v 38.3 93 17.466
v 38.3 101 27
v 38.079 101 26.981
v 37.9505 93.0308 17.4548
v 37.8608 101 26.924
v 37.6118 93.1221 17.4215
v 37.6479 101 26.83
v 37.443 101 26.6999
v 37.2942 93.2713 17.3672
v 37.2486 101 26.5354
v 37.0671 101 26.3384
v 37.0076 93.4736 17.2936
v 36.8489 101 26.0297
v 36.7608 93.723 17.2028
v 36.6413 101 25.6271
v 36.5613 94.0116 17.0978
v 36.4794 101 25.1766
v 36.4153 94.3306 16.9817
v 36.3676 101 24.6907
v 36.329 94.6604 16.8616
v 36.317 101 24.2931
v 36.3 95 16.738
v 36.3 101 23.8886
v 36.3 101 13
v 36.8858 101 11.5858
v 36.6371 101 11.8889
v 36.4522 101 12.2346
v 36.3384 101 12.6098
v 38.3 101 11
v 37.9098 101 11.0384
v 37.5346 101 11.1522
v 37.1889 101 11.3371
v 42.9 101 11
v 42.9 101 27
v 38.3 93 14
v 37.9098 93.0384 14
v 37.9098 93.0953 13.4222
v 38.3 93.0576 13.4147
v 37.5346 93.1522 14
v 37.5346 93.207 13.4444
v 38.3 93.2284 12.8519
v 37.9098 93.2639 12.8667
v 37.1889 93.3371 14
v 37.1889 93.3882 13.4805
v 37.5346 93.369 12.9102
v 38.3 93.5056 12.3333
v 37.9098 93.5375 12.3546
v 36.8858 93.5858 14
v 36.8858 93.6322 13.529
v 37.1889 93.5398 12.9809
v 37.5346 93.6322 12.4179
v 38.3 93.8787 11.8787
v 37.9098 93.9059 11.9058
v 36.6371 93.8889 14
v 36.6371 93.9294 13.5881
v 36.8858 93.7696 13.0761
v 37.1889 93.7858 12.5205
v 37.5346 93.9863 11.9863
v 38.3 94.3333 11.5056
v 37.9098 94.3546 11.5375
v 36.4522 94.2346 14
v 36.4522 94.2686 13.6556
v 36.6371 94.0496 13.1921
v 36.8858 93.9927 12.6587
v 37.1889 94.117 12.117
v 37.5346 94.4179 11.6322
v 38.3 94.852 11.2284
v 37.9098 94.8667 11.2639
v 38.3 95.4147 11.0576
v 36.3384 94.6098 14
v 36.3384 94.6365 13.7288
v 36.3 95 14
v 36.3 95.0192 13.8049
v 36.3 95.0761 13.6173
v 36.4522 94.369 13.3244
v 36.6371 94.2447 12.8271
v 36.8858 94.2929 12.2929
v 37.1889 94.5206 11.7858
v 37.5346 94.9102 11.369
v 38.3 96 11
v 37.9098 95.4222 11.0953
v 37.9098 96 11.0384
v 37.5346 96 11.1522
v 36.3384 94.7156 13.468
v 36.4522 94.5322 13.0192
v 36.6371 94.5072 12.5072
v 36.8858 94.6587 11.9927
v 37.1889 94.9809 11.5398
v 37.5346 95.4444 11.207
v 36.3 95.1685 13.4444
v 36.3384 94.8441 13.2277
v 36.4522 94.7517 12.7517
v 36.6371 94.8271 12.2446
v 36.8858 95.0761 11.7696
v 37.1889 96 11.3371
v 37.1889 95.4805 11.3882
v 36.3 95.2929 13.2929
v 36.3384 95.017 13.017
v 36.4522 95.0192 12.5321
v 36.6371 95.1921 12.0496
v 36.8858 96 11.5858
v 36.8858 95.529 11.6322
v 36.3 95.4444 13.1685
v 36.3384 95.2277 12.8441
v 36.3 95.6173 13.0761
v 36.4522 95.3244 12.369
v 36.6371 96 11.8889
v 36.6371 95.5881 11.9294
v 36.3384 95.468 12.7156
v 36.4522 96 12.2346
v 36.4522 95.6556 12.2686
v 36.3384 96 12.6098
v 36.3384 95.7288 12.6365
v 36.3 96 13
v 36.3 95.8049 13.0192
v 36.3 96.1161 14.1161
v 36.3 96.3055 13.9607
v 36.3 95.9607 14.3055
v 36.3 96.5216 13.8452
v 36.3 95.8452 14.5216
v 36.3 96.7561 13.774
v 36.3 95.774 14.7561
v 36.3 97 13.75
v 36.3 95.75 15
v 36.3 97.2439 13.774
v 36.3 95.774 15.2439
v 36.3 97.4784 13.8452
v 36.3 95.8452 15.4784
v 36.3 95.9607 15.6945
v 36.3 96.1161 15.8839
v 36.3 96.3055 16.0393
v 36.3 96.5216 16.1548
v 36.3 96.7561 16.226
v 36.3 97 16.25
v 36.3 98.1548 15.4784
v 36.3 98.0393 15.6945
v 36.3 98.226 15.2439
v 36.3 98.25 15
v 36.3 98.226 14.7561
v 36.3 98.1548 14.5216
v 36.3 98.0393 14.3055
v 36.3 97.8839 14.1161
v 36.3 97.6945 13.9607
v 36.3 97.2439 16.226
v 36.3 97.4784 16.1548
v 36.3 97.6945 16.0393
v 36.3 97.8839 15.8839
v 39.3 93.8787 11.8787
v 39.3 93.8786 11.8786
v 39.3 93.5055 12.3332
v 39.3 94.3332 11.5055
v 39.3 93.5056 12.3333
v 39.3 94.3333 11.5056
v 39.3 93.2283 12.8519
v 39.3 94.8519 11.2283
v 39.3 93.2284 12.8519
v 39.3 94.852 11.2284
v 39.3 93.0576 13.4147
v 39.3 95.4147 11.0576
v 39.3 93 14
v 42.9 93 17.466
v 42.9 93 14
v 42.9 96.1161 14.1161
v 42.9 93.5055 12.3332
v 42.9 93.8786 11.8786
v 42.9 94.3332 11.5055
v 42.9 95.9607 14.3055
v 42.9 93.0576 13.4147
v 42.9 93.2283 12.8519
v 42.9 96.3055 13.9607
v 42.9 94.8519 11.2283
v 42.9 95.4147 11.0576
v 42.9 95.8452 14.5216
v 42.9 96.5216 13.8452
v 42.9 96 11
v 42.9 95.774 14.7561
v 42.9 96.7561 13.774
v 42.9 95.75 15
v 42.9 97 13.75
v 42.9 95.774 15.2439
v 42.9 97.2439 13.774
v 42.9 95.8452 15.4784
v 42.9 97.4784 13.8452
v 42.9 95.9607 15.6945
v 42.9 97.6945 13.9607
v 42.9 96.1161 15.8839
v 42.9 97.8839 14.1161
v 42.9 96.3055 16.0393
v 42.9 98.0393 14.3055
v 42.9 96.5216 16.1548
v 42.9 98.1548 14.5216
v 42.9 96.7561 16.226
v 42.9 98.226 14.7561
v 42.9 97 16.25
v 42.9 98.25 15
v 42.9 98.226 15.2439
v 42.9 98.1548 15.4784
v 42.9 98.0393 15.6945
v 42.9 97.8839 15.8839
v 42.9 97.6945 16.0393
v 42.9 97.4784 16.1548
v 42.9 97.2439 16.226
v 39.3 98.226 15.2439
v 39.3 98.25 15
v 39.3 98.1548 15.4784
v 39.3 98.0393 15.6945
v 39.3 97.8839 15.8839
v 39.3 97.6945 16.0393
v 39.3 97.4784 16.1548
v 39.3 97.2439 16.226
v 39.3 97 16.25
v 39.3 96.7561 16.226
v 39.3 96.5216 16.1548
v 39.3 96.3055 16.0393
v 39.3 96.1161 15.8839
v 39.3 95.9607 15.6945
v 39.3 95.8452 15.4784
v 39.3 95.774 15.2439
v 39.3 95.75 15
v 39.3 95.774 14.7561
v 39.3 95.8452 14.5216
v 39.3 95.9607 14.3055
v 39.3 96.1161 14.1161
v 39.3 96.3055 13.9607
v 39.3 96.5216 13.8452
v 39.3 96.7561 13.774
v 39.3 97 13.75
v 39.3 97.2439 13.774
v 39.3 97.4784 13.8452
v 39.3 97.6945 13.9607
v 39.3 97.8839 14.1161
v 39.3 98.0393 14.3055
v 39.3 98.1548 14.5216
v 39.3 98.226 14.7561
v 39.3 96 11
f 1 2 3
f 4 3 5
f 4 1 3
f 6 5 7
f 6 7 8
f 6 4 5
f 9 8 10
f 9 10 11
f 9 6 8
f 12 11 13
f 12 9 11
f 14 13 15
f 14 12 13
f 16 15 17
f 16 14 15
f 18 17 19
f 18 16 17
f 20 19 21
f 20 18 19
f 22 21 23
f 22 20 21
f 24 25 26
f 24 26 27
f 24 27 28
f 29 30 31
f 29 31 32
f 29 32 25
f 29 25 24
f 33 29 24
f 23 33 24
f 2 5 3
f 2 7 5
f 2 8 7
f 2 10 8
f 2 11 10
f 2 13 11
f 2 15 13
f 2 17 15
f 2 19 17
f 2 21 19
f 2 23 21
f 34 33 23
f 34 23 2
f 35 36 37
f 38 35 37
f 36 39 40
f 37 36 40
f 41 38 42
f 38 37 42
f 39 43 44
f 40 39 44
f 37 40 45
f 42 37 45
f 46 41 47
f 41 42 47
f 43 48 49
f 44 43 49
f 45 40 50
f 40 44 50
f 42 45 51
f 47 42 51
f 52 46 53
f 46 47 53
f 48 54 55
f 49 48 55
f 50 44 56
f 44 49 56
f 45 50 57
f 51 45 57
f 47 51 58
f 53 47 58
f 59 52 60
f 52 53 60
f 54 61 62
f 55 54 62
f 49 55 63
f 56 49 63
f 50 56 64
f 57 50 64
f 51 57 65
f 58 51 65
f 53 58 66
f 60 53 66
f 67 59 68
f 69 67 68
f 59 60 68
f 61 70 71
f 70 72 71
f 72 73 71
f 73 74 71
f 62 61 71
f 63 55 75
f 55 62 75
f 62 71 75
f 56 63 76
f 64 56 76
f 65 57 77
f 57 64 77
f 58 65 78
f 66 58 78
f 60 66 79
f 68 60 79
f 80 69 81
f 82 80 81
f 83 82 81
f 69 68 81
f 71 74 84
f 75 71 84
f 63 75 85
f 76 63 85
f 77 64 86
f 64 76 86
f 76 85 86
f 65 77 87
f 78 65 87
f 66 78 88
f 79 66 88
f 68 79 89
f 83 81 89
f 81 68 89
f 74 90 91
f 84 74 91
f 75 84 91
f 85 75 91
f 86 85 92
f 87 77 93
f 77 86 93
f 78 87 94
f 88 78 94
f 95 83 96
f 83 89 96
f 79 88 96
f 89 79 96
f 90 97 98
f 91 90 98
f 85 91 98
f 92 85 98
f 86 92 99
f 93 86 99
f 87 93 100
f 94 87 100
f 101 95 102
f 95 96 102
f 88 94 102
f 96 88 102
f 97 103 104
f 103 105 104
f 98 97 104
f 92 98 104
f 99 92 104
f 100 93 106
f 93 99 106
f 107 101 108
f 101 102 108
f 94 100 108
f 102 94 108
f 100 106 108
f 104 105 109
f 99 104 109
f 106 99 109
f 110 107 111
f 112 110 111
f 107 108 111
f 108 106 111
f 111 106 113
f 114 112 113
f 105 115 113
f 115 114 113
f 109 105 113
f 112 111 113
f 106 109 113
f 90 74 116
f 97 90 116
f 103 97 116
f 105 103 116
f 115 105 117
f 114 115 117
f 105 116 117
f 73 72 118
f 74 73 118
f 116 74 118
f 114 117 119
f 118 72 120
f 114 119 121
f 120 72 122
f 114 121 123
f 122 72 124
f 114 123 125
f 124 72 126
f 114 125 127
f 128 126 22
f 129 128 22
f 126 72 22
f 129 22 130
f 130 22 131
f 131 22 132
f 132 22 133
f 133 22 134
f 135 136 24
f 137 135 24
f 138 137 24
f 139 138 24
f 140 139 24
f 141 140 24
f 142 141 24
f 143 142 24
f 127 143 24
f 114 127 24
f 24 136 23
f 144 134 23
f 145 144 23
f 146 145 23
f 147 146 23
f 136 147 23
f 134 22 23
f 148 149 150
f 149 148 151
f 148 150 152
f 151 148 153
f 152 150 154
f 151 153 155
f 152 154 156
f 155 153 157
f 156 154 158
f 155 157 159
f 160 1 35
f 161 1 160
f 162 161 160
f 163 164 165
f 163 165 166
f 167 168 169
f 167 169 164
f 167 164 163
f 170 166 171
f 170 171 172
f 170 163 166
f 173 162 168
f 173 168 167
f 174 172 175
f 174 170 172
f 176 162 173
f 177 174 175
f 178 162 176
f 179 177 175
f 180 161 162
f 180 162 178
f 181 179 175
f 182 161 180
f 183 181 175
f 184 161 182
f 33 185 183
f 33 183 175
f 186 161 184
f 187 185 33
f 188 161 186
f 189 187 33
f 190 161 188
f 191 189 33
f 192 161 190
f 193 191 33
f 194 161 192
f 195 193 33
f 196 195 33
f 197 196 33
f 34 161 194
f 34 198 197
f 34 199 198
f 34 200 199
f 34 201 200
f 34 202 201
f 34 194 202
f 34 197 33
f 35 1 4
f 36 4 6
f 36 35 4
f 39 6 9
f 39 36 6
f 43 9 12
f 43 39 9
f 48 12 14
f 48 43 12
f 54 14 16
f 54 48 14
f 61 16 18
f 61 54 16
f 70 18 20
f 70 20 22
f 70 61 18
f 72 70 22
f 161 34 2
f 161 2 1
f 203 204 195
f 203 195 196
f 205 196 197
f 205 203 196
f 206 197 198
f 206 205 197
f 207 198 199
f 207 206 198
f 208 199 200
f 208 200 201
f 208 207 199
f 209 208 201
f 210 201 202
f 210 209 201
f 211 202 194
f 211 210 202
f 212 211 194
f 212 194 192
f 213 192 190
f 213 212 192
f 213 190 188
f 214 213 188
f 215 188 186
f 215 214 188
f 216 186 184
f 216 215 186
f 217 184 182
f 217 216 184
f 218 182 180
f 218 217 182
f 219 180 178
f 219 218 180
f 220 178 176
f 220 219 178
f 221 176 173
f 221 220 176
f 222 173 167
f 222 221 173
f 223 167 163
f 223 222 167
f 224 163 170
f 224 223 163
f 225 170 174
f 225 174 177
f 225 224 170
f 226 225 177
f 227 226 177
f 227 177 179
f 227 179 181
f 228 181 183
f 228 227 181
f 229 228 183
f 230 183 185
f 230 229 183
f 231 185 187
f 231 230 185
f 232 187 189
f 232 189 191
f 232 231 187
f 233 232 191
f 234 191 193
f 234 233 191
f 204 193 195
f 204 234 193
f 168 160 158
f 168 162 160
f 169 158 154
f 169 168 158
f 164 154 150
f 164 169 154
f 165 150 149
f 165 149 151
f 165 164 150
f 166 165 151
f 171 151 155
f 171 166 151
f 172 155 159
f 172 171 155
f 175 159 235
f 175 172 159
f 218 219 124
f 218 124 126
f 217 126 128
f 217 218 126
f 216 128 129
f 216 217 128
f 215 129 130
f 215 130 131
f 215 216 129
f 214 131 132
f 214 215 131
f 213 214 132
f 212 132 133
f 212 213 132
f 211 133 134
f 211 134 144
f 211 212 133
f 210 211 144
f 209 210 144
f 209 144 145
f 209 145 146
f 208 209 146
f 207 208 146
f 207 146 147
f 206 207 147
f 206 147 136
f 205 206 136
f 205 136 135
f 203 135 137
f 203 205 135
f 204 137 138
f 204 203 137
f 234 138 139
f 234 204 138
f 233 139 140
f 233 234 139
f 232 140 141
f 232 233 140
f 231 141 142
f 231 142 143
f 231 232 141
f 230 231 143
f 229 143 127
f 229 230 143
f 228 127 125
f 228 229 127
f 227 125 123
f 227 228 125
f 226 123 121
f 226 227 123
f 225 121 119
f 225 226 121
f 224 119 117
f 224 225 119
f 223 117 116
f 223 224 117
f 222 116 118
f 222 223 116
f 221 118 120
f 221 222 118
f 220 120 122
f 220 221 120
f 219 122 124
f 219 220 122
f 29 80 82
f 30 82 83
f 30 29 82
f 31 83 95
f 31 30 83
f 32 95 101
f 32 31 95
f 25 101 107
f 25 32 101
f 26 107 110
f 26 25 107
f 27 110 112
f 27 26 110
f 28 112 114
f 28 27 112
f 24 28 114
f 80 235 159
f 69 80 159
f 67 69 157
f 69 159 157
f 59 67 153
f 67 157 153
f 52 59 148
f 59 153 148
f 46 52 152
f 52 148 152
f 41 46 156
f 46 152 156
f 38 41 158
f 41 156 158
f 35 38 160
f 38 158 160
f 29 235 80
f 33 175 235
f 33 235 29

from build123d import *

# Parameters (mm, degrees)
SKETCH062_R  = 1.25
PAD029_DEPTH = 1.8
SKETCH064_R  = 1.25
PAD032_DEPTH = 3
FILLET004_R  = 2


with BuildPart() as part:
    # Sketch062 → Pad029 (new body, symmetric)
    with BuildSketch(Plane.YZ.offset(-41.1)):
        with BuildLine():
            Line((96.000005, 10.999996), (100.999998, 10.999996))
            Line((100.999998, 10.999996), (100.999998, 27))
            Line((100.999998, 27), (92.999998, 17.465971))
            Line((92.999998, 14), (92.999998, 17.465971))
            ThreePointArc((92.999998, 14), (93.878624, 11.87862), (96.000005, 10.999996))
        make_face()
        with Locations((97, 15)):
            Circle(SKETCH062_R, mode=Mode.SUBTRACT)
    extrude(amount=PAD029_DEPTH, both=True)

    # Sketch064 (on Face7 of Clone022) → Pad032 (new body)
    with BuildSketch(Plane(origin=(-42.9, 0, 0), x_dir=(0, -1, 0), z_dir=(-1, 0, 0))):
        with BuildLine():
            Line((-100.999998, 27), (-92.999998, 17.465971))
            Line((-92.999998, 17.465971), (-92.999998, 14))
            ThreePointArc((-96.000005, 10.999996), (-93.87868, 11.878676), (-92.999998, 14))
            Line((-96.000005, 10.999996), (-100.999998, 10.999996))
            Line((-100.999998, 10.999996), (-100.999998, 27))
        make_face()
        with Locations((-97, 15)):
            Circle(SKETCH064_R, mode=Mode.SUBTRACT)
    extrude(amount=PAD032_DEPTH)

    # Fillet004
    fillet004_edges = [part.edges().sort_by_distance(p)[0] for p in [
        (-45.9, 98.500001, 10.999996),
        (-45.9, 93.87868, 11.878676),
        (-45.9, 92.999998, 15.732986),
        (-45.9, 96.999998, 22.232986),
    ]]
    fillet(fillet004_edges, radius=FILLET004_R)


with BuildPart() as part_1:
    # Body045 placement: moved
    add(part.part.moved(Location((82.2, 0, 0))))


solid = part_1.part
